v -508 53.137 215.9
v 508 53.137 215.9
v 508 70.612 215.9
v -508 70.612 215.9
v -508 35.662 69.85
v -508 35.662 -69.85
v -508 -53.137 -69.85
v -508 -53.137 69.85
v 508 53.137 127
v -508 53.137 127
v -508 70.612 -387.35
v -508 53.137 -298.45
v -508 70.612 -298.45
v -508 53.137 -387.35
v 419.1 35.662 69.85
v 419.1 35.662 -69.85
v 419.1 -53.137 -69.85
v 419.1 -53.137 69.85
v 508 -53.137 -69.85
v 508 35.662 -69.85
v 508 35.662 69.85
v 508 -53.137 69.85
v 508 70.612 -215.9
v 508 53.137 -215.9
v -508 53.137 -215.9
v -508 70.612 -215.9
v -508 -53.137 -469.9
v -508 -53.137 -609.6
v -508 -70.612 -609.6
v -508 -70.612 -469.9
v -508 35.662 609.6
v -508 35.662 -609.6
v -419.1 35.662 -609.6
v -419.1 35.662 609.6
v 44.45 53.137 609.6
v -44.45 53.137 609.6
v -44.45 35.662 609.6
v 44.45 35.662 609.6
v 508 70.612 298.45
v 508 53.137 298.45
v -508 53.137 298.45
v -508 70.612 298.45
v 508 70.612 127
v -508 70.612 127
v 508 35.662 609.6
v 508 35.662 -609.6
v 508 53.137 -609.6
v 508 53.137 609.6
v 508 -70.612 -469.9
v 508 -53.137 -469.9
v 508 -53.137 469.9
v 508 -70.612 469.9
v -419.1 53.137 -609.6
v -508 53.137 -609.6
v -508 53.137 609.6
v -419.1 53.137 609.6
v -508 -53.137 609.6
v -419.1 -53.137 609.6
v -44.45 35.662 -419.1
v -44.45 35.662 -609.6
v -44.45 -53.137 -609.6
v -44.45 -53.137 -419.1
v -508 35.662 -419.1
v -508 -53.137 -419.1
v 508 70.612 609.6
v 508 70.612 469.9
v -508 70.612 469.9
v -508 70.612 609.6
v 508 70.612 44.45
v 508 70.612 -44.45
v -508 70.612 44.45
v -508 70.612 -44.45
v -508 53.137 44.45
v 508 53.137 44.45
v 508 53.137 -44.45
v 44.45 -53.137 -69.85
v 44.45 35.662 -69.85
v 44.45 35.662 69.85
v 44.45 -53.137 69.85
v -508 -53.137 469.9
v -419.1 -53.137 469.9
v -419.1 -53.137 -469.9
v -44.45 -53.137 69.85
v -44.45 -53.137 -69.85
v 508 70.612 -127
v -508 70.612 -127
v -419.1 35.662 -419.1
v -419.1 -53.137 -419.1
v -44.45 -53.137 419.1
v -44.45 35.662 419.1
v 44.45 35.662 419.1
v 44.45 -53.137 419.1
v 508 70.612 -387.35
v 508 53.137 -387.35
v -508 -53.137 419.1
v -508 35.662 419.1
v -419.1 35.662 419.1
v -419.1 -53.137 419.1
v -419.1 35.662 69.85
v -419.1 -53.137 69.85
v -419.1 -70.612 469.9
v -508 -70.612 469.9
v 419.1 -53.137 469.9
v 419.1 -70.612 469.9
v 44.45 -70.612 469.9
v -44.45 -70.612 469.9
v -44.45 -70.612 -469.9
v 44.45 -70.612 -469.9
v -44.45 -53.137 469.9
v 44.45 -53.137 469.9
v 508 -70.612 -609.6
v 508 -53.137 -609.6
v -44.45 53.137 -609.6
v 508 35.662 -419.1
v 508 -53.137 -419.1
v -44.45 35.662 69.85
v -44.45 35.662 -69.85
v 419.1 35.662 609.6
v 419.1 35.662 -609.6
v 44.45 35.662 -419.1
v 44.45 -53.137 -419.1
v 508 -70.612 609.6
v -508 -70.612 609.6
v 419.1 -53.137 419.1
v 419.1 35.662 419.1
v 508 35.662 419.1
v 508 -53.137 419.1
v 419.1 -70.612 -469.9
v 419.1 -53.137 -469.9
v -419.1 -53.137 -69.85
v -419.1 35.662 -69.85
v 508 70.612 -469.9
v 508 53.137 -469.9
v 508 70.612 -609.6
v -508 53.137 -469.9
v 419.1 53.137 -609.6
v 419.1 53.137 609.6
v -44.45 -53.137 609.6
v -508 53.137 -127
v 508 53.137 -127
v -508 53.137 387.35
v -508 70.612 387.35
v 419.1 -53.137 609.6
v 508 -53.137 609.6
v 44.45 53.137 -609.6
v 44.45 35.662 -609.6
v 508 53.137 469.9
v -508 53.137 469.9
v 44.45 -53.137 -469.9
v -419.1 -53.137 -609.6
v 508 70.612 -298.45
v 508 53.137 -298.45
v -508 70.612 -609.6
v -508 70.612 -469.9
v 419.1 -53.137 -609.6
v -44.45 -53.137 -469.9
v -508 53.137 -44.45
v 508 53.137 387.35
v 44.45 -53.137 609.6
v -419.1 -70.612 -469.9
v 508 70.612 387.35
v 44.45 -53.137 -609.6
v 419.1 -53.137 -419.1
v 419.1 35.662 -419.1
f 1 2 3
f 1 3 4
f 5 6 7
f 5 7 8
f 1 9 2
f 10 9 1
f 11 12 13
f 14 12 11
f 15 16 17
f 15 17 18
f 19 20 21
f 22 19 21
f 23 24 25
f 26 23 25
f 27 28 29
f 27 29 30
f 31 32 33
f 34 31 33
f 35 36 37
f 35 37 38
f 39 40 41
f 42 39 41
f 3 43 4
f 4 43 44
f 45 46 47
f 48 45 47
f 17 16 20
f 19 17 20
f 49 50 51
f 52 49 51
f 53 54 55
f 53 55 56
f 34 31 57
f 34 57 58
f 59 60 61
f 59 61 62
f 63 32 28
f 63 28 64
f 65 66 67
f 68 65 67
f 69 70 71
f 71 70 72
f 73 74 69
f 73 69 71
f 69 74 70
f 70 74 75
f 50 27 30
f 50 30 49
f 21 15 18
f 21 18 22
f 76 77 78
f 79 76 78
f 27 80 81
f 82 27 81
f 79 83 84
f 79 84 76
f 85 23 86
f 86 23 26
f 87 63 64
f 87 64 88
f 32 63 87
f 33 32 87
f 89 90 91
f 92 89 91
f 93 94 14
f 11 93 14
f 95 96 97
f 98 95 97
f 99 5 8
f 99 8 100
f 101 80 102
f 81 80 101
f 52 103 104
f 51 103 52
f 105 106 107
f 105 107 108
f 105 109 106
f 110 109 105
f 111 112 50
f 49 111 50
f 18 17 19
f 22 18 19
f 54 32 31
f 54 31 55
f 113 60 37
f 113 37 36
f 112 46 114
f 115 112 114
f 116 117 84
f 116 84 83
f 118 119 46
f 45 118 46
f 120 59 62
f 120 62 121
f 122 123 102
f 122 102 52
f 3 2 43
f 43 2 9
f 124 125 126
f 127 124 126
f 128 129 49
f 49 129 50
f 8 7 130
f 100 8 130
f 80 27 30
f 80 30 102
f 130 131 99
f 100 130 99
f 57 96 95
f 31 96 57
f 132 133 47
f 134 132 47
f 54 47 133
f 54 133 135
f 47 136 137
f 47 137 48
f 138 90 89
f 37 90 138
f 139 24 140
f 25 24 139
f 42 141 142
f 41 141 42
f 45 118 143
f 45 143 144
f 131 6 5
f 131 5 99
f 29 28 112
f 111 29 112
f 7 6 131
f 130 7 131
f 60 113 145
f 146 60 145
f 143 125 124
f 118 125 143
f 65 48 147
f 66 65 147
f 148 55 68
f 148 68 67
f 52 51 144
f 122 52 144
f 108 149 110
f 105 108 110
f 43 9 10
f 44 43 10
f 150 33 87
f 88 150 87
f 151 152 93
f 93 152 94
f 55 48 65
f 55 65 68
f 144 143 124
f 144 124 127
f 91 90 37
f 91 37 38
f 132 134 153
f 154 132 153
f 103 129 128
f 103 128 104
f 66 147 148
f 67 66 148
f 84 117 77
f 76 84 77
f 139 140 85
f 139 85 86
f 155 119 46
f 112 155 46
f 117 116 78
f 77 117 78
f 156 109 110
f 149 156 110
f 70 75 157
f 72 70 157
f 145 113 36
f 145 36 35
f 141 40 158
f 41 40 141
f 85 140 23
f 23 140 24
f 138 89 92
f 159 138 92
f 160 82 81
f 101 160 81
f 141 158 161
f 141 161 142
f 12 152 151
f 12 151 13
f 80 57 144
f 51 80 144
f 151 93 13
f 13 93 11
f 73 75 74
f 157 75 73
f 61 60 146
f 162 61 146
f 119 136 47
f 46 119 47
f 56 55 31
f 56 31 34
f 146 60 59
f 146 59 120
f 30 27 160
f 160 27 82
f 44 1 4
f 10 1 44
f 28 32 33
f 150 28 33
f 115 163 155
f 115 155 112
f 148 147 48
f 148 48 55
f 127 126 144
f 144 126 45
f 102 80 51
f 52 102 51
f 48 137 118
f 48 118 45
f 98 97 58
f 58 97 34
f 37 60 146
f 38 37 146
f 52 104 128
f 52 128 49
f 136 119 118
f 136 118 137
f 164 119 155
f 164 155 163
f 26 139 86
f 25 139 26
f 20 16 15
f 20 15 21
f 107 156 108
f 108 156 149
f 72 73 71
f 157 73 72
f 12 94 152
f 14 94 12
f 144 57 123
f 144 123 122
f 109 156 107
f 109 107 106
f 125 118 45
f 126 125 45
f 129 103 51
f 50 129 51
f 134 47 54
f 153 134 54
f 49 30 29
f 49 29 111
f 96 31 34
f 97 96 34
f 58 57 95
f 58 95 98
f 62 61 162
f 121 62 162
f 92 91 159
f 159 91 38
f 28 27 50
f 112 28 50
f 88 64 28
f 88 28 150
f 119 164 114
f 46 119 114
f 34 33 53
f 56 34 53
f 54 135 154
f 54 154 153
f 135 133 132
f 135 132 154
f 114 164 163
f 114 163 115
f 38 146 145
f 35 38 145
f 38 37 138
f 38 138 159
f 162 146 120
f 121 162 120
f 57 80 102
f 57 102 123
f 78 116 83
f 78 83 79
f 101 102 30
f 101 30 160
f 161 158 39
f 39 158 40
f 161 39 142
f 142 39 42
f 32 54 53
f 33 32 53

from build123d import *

# Parameters (mm, degrees)
BOSS_EXTRUDE1_DEPTH        = 609.6
BOSS_EXTRUDE1_DEPTH_BACK   = 609.6
SKETCH3_W                  = 88.9
SKETCH3_H                  = 17.4752
BOSS_EXTRUDE1_2_DEPTH      = 609.6
BOSS_EXTRUDE1_2_DEPTH_BACK = 609.6
BOSS_EXTRUDE1_3_DEPTH      = 609.6
BOSS_EXTRUDE1_3_DEPTH_BACK = 609.6
SKETCH4_W                  = 1016
SKETCH4_H                  = 139.7
BOSS_EXTRUDE2_DEPTH        = 17.4752
SKETCH4_H_2                = 88.9
BOSS_EXTRUDE2_2_DEPTH      = 17.4752
BOSS_EXTRUDE2_3_DEPTH      = 17.4752
BOSS_EXTRUDE2_4_DEPTH      = 17.4752
BOSS_EXTRUDE2_5_DEPTH      = 17.4752
BOSS_EXTRUDE2_6_DEPTH      = 17.4752
BOSS_EXTRUDE2_7_DEPTH      = 17.4752
SKETCH9_W                  = 88.9
SKETCH9_H                  = 190.5
BOSS_EXTRUDE4_DEPTH        = 88.7984
SKETCH9_H_2                = 139.7
BOSS_EXTRUDE4_2_DEPTH      = 88.7984
BOSS_EXTRUDE4_3_DEPTH      = 88.7984
BOSS_EXTRUDE4_4_DEPTH      = 88.7984
BOSS_EXTRUDE4_5_DEPTH      = 88.7984
BOSS_EXTRUDE4_6_DEPTH      = 88.7984
BOSS_EXTRUDE4_7_DEPTH      = 88.7984
BOSS_EXTRUDE4_8_DEPTH      = 88.7984
BOSS_EXTRUDE4_9_DEPTH      = 88.7984
SKETCH5_W                  = 1016
SKETCH5_H                  = 139.7
BOSS_EXTRUDE3_DEPTH        = 17.4752
BOSS_EXTRUDE3_2_DEPTH      = 17.4752
SKETCH11_W                 = 88.9
SKETCH11_H                 = 939.8
BOSS_EXTRUDE5_DEPTH        = 17.4752
BOSS_EXTRUDE5_2_DEPTH      = 17.4752
BOSS_EXTRUDE5_3_DEPTH      = 17.4752


with BuildPart() as part:
    # Sketch3 → Boss-Extrude1 (new, two sides: drawn at the far end of the back side and taken through both)
    with BuildSketch(Plane.XY.offset(-BOSS_EXTRUDE1_DEPTH_BACK)):
        with Locations((-463.55, 44.3992)):
            Rectangle(SKETCH3_W, SKETCH3_H)
    extrude(amount=BOSS_EXTRUDE1_DEPTH + BOSS_EXTRUDE1_DEPTH_BACK)


with BuildPart() as body_2:
    # Sketch3 → Boss-Extrude1 2 (new, two sides: drawn at the far end of the back side and taken through both)
    with BuildSketch(Plane.XY.offset(-BOSS_EXTRUDE1_2_DEPTH_BACK)):
        with Locations((0, 44.3992)):
            Rectangle(SKETCH3_W, SKETCH3_H)
    extrude(amount=BOSS_EXTRUDE1_2_DEPTH + BOSS_EXTRUDE1_2_DEPTH_BACK)


with BuildPart() as body_3:
    # Sketch3 → Boss-Extrude1 3 (new, two sides: drawn at the far end of the back side and taken through both)
    with BuildSketch(Plane.XY.offset(-BOSS_EXTRUDE1_3_DEPTH_BACK)):
        with Locations((463.55, 44.3992)):
            Rectangle(SKETCH3_W, SKETCH3_H)
    extrude(amount=BOSS_EXTRUDE1_3_DEPTH + BOSS_EXTRUDE1_3_DEPTH_BACK)


with BuildPart() as body_4:
    # Sketch4 → Boss-Extrude2 (new body)
    with BuildSketch(Plane(origin=(0, 53.1368, 0), x_dir=(-1, 0, 0), z_dir=(0, -1, 0))):
        with Locations((0, 539.75)):
            Rectangle(SKETCH4_W, SKETCH4_H)
    extrude(amount=-BOSS_EXTRUDE2_DEPTH)


with BuildPart() as body_5:
    # Sketch4 → Boss-Extrude2 2 (new body)
    with BuildSketch(Plane(origin=(0, 53.1368, 0), x_dir=(-1, 0, 0), z_dir=(0, -1, 0))):
        with Locations((0, 171.45)):
            Rectangle(SKETCH4_W, SKETCH4_H_2)
    extrude(amount=-BOSS_EXTRUDE2_2_DEPTH)


with BuildPart() as body_6:
    # Sketch4 → Boss-Extrude2 3 (new body)
    with BuildSketch(Plane(origin=(0, 53.1368, 0), x_dir=(-1, 0, 0), z_dir=(0, -1, 0))):
        with Locations((0, 342.9)):
            Rectangle(SKETCH4_W, SKETCH4_H_2)
    extrude(amount=-BOSS_EXTRUDE2_3_DEPTH)


with BuildPart() as body_7:
    # Sketch4 → Boss-Extrude2 4 (new body)
    with BuildSketch(Plane(origin=(0, 53.1368, 0), x_dir=(-1, 0, 0), z_dir=(0, -1, 0))):
        Rectangle(SKETCH4_W, SKETCH4_H_2)
    extrude(amount=-BOSS_EXTRUDE2_4_DEPTH)


with BuildPart() as body_8:
    # Sketch4 → Boss-Extrude2 5 (new body)
    with BuildSketch(Plane(origin=(0, 53.1368, 0), x_dir=(-1, 0, 0), z_dir=(0, -1, 0))):
        with Locations((0, -171.45)):
            Rectangle(SKETCH4_W, SKETCH4_H_2)
    extrude(amount=-BOSS_EXTRUDE2_5_DEPTH)


with BuildPart() as body_9:
    # Sketch4 → Boss-Extrude2 6 (new body)
    with BuildSketch(Plane(origin=(0, 53.1368, 0), x_dir=(-1, 0, 0), z_dir=(0, -1, 0))):
        with Locations((0, -342.9)):
            Rectangle(SKETCH4_W, SKETCH4_H_2)
    extrude(amount=-BOSS_EXTRUDE2_6_DEPTH)


with BuildPart() as body_10:
    # Sketch4 → Boss-Extrude2 7 (new body)
    with BuildSketch(Plane(origin=(0, 53.1368, 0), x_dir=(-1, 0, 0), z_dir=(0, -1, 0))):
        with Locations((0, -539.75)):
            Rectangle(SKETCH4_W, SKETCH4_H)
    extrude(amount=-BOSS_EXTRUDE2_7_DEPTH)


with BuildPart() as body_11:
    # Sketch9 → Boss-Extrude4 (new body)
    with BuildSketch(Plane.XZ.offset(-35.6616)):
        with Locations((463.55, 514.35)):
            Rectangle(SKETCH9_W, SKETCH9_H)
    extrude(amount=BOSS_EXTRUDE4_DEPTH)


with BuildPart() as body_12:
    # Sketch9 → Boss-Extrude4 2 (new body)
    with BuildSketch(Plane.XZ.offset(-35.6616)):
        with Locations((463.55, 0)):
            Rectangle(SKETCH9_W, SKETCH9_H_2)
    extrude(amount=BOSS_EXTRUDE4_2_DEPTH)


with BuildPart() as body_13:
    # Sketch9 → Boss-Extrude4 3 (new body)
    with BuildSketch(Plane.XZ.offset(-35.6616)):
        with Locations((463.55, -514.35)):
            Rectangle(SKETCH9_W, SKETCH9_H)
    extrude(amount=BOSS_EXTRUDE4_3_DEPTH)


with BuildPart() as body_14:
    # Sketch9 → Boss-Extrude4 4 (new body)
    with BuildSketch(Plane.XZ.offset(-35.6616)):
        with Locations((0, 514.35)):
            Rectangle(SKETCH9_W, SKETCH9_H)
    extrude(amount=BOSS_EXTRUDE4_4_DEPTH)


with BuildPart() as body_15:
    # Sketch9 → Boss-Extrude4 5 (new body)
    with BuildSketch(Plane.XZ.offset(-35.6616)):
        Rectangle(SKETCH9_W, SKETCH9_H_2)
    extrude(amount=BOSS_EXTRUDE4_5_DEPTH)


with BuildPart() as body_16:
    # Sketch9 → Boss-Extrude4 6 (new body)
    with BuildSketch(Plane.XZ.offset(-35.6616)):
        with Locations((0, -514.35)):
            Rectangle(SKETCH9_W, SKETCH9_H)
    extrude(amount=BOSS_EXTRUDE4_6_DEPTH)


with BuildPart() as body_17:
    # Sketch9 → Boss-Extrude4 7 (new body)
    with BuildSketch(Plane.XZ.offset(-35.6616)):
        with Locations((-463.55, 514.35)):
            Rectangle(SKETCH9_W, SKETCH9_H)
    extrude(amount=BOSS_EXTRUDE4_7_DEPTH)


with BuildPart() as body_18:
    # Sketch9 → Boss-Extrude4 8 (new body)
    with BuildSketch(Plane.XZ.offset(-35.6616)):
        with Locations((-463.55, 0)):
            Rectangle(SKETCH9_W, SKETCH9_H_2)
    extrude(amount=BOSS_EXTRUDE4_8_DEPTH)


with BuildPart() as body_19:
    # Sketch9 → Boss-Extrude4 9 (new body)
    with BuildSketch(Plane.XZ.offset(-35.6616)):
        with Locations((-463.55, -514.35)):
            Rectangle(SKETCH9_W, SKETCH9_H)
    extrude(amount=BOSS_EXTRUDE4_9_DEPTH)


with BuildPart() as body_20:
    # Sketch5 → Boss-Extrude3 (new body)
    with BuildSketch(Plane.XZ.offset(53.1368)):
        with Locations((0, 539.75)):
            Rectangle(SKETCH5_W, SKETCH5_H)
    extrude(amount=BOSS_EXTRUDE3_DEPTH)


with BuildPart() as body_21:
    # Sketch5 → Boss-Extrude3 2 (new body)
    with BuildSketch(Plane.XZ.offset(53.1368)):
        with Locations((0, -539.75)):
            Rectangle(SKETCH5_W, SKETCH5_H)
    extrude(amount=BOSS_EXTRUDE3_2_DEPTH)


with BuildPart() as body_22:
    # Sketch11 → Boss-Extrude5 (new body)
    with BuildSketch(Plane.XZ.offset(53.1368)):
        with Locations((-463.55, 0)):
            Rectangle(SKETCH11_W, SKETCH11_H)
    extrude(amount=BOSS_EXTRUDE5_DEPTH)


with BuildPart() as body_23:
    # Sketch11 → Boss-Extrude5 2 (new body)
    with BuildSketch(Plane.XZ.offset(53.1368)):
        Rectangle(SKETCH11_W, SKETCH11_H)
    extrude(amount=BOSS_EXTRUDE5_2_DEPTH)


with BuildPart() as body_24:
    # Sketch11 → Boss-Extrude5 3 (new body)
    with BuildSketch(Plane.XZ.offset(53.1368)):
        with Locations((463.55, 0)):
            Rectangle(SKETCH11_W, SKETCH11_H)
    extrude(amount=BOSS_EXTRUDE5_3_DEPTH)


solid = Compound([part.part, body_2.part, body_3.part, body_4.part, body_5.part, body_6.part, body_7.part, body_8.part, body_9.part, body_10.part, body_11.part, body_12.part, body_13.part, body_14.part, body_15.part, body_16.part, body_17.part, body_18.part, body_19.part, body_20.part, body_21.part, body_22.part, body_23.part, body_24.part])
